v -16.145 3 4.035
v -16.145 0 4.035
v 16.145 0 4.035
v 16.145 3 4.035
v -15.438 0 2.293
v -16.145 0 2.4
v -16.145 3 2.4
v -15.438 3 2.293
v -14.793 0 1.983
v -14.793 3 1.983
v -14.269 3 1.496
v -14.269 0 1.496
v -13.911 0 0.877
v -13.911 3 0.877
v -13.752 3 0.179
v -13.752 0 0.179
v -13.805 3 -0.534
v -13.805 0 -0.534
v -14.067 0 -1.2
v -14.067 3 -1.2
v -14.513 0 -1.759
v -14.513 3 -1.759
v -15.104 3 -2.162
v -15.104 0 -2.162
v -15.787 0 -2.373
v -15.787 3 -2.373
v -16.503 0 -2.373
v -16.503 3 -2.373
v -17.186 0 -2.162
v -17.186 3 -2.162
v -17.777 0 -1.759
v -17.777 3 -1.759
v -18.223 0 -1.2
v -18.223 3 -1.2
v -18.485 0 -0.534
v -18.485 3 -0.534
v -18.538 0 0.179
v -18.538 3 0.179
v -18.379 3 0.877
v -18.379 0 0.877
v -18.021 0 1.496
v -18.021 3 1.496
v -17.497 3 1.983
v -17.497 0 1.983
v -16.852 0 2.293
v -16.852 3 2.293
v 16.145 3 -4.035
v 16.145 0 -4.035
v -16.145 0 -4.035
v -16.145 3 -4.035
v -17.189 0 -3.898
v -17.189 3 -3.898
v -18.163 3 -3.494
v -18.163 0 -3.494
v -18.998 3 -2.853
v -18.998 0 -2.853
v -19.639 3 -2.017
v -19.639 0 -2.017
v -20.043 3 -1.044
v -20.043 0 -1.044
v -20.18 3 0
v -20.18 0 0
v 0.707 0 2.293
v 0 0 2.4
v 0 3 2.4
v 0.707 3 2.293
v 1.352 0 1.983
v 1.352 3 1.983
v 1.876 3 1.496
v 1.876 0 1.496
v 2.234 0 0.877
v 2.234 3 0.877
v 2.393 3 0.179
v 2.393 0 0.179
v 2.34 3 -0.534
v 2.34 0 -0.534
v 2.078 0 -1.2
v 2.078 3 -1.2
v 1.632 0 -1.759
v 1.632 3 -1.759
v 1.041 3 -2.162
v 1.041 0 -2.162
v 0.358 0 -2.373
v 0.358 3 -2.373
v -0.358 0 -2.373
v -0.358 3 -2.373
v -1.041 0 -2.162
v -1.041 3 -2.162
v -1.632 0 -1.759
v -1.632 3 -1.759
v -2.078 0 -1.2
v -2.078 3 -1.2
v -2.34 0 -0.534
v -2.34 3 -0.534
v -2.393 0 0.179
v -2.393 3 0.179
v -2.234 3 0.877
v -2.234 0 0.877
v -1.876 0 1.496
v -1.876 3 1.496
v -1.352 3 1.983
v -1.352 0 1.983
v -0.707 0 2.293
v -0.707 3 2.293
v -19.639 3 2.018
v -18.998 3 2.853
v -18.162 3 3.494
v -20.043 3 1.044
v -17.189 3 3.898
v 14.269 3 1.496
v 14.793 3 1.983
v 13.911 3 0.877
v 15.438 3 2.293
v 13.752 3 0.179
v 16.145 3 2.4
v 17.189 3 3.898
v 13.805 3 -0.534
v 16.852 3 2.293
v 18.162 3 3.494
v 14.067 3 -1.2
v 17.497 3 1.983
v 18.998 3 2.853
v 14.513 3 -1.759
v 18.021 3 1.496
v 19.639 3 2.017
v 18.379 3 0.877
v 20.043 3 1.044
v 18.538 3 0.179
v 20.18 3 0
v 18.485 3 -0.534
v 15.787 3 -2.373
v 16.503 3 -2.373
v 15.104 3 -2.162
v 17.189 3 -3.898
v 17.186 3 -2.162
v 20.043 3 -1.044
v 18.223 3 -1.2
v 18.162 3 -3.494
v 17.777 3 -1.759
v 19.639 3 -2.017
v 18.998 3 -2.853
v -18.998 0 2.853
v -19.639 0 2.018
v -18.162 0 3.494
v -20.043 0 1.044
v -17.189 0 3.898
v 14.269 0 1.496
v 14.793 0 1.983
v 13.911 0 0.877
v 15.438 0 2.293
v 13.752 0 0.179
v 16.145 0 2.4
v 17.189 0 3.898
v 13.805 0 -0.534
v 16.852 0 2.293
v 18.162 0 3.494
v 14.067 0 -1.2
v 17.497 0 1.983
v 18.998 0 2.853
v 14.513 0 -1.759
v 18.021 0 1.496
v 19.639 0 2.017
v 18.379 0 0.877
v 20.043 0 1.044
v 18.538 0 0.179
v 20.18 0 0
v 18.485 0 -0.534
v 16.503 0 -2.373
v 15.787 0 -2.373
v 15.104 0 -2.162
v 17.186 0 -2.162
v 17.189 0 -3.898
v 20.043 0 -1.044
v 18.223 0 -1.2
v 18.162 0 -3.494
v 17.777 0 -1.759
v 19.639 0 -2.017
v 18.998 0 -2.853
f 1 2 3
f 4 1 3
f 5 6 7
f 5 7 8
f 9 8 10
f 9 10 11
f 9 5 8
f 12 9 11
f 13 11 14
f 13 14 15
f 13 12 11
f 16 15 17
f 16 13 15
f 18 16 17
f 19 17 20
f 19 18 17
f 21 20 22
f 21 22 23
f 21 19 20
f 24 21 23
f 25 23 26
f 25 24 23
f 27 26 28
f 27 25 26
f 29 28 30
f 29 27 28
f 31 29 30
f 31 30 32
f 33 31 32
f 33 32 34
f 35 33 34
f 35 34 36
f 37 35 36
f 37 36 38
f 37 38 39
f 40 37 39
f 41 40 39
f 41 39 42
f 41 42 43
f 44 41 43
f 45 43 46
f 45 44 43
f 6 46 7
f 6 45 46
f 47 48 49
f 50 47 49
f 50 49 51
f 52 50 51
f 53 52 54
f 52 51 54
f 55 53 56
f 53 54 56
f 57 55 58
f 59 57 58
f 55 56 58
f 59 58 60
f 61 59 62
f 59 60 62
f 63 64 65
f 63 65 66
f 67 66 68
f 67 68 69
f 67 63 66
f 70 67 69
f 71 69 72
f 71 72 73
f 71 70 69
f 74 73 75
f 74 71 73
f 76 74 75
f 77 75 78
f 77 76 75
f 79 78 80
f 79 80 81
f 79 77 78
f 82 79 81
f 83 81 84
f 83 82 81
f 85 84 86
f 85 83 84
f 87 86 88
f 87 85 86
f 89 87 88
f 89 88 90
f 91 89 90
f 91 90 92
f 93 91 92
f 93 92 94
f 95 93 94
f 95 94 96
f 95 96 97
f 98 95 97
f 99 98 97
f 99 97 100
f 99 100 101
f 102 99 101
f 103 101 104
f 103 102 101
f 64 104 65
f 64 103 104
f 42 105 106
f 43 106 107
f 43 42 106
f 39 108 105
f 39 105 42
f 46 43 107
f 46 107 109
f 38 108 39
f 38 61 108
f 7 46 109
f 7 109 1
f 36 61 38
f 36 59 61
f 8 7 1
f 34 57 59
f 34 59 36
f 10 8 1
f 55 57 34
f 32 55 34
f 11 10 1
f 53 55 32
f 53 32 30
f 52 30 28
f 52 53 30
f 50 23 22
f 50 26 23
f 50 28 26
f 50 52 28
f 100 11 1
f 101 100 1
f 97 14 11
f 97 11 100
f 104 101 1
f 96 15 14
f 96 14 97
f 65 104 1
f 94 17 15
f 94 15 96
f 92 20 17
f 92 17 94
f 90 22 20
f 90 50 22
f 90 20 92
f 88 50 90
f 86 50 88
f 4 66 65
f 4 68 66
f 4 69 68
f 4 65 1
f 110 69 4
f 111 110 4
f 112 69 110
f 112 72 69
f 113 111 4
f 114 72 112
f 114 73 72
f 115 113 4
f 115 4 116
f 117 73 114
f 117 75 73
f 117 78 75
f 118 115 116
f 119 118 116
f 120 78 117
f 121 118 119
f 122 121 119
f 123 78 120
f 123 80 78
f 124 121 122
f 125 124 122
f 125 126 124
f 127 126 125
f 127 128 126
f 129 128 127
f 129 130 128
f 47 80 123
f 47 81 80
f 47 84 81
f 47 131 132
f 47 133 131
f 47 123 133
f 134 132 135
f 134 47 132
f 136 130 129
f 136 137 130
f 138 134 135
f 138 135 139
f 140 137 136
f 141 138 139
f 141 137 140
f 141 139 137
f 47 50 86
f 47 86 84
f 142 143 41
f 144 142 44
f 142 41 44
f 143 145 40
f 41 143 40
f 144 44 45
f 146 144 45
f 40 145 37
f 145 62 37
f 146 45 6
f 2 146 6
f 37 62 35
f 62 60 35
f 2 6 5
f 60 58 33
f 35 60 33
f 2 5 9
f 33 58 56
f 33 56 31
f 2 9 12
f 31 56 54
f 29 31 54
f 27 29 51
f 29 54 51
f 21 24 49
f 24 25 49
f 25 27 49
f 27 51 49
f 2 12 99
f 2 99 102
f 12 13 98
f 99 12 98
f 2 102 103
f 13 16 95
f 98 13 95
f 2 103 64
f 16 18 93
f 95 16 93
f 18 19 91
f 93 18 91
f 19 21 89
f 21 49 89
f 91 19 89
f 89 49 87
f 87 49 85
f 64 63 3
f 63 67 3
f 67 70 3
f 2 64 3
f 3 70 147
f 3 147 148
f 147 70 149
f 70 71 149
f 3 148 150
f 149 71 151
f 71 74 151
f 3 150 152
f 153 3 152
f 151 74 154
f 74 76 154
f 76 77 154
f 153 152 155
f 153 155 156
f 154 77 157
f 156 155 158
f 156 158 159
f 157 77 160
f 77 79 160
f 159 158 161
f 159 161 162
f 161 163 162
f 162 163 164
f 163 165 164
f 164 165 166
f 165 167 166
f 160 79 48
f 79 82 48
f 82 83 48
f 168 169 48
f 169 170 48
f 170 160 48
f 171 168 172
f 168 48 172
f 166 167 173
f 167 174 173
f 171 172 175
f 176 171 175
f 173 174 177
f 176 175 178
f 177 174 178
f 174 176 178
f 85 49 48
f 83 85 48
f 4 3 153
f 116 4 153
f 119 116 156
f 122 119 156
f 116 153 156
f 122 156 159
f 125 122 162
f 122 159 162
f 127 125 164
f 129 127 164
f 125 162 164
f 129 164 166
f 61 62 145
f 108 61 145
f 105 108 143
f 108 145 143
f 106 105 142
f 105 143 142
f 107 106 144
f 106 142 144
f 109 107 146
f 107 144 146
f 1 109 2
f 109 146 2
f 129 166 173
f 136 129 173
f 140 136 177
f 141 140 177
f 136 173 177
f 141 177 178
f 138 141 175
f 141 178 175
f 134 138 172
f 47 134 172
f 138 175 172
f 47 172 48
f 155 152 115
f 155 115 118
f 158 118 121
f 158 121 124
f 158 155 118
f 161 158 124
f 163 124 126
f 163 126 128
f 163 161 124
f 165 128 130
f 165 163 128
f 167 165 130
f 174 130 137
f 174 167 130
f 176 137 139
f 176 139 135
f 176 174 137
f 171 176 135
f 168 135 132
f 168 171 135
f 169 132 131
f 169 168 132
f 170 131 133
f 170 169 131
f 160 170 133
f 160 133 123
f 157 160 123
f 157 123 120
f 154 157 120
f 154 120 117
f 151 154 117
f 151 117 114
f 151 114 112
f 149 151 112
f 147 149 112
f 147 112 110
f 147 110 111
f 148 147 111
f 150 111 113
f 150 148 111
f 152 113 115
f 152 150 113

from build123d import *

# Parameters (mm, degrees)
SKETCH1_R           = 2.4
BOSS_EXTRUDE2_DEPTH = 3


with BuildPart() as part:
    # Sketch1 → Boss-Extrude2 (new body)
    with BuildSketch(Plane(origin=(0, 0, 0), x_dir=(1, 0, 0), z_dir=(0, 1, 0))):
        with BuildLine():
            Line((16.145, 4.035), (-16.145, 4.035))
            ThreePointArc((-16.145, 4.035), (-18.99817587, 2.853175854), (-20.18, -2.2e-08))
            ThreePointArc((-20.18, -2.2e-08), (-18.998175854, -2.85317587), (-16.145, -4.035))
            Line((-16.145, -4.035), (16.145, -4.035))
            ThreePointArc((16.145, -4.035), (18.998175862, -2.853175862), (20.18, 0))
            ThreePointArc((20.18, 0), (18.998175862, 2.853175862), (16.145, 4.035))
        make_face()
        with Locations(Location((-16.145, 0, 0), (0, 0, 270))):
            Circle(SKETCH1_R, mode=Mode.SUBTRACT)
        with Locations(Location((0, 0, 0), (0, 0, 270))):
            Circle(SKETCH1_R, mode=Mode.SUBTRACT)
        with Locations(Location((16.145, 0, 0), (0, 0, 270))):
            Circle(SKETCH1_R, mode=Mode.SUBTRACT)
    extrude(amount=BOSS_EXTRUDE2_DEPTH)


solid = part.part
